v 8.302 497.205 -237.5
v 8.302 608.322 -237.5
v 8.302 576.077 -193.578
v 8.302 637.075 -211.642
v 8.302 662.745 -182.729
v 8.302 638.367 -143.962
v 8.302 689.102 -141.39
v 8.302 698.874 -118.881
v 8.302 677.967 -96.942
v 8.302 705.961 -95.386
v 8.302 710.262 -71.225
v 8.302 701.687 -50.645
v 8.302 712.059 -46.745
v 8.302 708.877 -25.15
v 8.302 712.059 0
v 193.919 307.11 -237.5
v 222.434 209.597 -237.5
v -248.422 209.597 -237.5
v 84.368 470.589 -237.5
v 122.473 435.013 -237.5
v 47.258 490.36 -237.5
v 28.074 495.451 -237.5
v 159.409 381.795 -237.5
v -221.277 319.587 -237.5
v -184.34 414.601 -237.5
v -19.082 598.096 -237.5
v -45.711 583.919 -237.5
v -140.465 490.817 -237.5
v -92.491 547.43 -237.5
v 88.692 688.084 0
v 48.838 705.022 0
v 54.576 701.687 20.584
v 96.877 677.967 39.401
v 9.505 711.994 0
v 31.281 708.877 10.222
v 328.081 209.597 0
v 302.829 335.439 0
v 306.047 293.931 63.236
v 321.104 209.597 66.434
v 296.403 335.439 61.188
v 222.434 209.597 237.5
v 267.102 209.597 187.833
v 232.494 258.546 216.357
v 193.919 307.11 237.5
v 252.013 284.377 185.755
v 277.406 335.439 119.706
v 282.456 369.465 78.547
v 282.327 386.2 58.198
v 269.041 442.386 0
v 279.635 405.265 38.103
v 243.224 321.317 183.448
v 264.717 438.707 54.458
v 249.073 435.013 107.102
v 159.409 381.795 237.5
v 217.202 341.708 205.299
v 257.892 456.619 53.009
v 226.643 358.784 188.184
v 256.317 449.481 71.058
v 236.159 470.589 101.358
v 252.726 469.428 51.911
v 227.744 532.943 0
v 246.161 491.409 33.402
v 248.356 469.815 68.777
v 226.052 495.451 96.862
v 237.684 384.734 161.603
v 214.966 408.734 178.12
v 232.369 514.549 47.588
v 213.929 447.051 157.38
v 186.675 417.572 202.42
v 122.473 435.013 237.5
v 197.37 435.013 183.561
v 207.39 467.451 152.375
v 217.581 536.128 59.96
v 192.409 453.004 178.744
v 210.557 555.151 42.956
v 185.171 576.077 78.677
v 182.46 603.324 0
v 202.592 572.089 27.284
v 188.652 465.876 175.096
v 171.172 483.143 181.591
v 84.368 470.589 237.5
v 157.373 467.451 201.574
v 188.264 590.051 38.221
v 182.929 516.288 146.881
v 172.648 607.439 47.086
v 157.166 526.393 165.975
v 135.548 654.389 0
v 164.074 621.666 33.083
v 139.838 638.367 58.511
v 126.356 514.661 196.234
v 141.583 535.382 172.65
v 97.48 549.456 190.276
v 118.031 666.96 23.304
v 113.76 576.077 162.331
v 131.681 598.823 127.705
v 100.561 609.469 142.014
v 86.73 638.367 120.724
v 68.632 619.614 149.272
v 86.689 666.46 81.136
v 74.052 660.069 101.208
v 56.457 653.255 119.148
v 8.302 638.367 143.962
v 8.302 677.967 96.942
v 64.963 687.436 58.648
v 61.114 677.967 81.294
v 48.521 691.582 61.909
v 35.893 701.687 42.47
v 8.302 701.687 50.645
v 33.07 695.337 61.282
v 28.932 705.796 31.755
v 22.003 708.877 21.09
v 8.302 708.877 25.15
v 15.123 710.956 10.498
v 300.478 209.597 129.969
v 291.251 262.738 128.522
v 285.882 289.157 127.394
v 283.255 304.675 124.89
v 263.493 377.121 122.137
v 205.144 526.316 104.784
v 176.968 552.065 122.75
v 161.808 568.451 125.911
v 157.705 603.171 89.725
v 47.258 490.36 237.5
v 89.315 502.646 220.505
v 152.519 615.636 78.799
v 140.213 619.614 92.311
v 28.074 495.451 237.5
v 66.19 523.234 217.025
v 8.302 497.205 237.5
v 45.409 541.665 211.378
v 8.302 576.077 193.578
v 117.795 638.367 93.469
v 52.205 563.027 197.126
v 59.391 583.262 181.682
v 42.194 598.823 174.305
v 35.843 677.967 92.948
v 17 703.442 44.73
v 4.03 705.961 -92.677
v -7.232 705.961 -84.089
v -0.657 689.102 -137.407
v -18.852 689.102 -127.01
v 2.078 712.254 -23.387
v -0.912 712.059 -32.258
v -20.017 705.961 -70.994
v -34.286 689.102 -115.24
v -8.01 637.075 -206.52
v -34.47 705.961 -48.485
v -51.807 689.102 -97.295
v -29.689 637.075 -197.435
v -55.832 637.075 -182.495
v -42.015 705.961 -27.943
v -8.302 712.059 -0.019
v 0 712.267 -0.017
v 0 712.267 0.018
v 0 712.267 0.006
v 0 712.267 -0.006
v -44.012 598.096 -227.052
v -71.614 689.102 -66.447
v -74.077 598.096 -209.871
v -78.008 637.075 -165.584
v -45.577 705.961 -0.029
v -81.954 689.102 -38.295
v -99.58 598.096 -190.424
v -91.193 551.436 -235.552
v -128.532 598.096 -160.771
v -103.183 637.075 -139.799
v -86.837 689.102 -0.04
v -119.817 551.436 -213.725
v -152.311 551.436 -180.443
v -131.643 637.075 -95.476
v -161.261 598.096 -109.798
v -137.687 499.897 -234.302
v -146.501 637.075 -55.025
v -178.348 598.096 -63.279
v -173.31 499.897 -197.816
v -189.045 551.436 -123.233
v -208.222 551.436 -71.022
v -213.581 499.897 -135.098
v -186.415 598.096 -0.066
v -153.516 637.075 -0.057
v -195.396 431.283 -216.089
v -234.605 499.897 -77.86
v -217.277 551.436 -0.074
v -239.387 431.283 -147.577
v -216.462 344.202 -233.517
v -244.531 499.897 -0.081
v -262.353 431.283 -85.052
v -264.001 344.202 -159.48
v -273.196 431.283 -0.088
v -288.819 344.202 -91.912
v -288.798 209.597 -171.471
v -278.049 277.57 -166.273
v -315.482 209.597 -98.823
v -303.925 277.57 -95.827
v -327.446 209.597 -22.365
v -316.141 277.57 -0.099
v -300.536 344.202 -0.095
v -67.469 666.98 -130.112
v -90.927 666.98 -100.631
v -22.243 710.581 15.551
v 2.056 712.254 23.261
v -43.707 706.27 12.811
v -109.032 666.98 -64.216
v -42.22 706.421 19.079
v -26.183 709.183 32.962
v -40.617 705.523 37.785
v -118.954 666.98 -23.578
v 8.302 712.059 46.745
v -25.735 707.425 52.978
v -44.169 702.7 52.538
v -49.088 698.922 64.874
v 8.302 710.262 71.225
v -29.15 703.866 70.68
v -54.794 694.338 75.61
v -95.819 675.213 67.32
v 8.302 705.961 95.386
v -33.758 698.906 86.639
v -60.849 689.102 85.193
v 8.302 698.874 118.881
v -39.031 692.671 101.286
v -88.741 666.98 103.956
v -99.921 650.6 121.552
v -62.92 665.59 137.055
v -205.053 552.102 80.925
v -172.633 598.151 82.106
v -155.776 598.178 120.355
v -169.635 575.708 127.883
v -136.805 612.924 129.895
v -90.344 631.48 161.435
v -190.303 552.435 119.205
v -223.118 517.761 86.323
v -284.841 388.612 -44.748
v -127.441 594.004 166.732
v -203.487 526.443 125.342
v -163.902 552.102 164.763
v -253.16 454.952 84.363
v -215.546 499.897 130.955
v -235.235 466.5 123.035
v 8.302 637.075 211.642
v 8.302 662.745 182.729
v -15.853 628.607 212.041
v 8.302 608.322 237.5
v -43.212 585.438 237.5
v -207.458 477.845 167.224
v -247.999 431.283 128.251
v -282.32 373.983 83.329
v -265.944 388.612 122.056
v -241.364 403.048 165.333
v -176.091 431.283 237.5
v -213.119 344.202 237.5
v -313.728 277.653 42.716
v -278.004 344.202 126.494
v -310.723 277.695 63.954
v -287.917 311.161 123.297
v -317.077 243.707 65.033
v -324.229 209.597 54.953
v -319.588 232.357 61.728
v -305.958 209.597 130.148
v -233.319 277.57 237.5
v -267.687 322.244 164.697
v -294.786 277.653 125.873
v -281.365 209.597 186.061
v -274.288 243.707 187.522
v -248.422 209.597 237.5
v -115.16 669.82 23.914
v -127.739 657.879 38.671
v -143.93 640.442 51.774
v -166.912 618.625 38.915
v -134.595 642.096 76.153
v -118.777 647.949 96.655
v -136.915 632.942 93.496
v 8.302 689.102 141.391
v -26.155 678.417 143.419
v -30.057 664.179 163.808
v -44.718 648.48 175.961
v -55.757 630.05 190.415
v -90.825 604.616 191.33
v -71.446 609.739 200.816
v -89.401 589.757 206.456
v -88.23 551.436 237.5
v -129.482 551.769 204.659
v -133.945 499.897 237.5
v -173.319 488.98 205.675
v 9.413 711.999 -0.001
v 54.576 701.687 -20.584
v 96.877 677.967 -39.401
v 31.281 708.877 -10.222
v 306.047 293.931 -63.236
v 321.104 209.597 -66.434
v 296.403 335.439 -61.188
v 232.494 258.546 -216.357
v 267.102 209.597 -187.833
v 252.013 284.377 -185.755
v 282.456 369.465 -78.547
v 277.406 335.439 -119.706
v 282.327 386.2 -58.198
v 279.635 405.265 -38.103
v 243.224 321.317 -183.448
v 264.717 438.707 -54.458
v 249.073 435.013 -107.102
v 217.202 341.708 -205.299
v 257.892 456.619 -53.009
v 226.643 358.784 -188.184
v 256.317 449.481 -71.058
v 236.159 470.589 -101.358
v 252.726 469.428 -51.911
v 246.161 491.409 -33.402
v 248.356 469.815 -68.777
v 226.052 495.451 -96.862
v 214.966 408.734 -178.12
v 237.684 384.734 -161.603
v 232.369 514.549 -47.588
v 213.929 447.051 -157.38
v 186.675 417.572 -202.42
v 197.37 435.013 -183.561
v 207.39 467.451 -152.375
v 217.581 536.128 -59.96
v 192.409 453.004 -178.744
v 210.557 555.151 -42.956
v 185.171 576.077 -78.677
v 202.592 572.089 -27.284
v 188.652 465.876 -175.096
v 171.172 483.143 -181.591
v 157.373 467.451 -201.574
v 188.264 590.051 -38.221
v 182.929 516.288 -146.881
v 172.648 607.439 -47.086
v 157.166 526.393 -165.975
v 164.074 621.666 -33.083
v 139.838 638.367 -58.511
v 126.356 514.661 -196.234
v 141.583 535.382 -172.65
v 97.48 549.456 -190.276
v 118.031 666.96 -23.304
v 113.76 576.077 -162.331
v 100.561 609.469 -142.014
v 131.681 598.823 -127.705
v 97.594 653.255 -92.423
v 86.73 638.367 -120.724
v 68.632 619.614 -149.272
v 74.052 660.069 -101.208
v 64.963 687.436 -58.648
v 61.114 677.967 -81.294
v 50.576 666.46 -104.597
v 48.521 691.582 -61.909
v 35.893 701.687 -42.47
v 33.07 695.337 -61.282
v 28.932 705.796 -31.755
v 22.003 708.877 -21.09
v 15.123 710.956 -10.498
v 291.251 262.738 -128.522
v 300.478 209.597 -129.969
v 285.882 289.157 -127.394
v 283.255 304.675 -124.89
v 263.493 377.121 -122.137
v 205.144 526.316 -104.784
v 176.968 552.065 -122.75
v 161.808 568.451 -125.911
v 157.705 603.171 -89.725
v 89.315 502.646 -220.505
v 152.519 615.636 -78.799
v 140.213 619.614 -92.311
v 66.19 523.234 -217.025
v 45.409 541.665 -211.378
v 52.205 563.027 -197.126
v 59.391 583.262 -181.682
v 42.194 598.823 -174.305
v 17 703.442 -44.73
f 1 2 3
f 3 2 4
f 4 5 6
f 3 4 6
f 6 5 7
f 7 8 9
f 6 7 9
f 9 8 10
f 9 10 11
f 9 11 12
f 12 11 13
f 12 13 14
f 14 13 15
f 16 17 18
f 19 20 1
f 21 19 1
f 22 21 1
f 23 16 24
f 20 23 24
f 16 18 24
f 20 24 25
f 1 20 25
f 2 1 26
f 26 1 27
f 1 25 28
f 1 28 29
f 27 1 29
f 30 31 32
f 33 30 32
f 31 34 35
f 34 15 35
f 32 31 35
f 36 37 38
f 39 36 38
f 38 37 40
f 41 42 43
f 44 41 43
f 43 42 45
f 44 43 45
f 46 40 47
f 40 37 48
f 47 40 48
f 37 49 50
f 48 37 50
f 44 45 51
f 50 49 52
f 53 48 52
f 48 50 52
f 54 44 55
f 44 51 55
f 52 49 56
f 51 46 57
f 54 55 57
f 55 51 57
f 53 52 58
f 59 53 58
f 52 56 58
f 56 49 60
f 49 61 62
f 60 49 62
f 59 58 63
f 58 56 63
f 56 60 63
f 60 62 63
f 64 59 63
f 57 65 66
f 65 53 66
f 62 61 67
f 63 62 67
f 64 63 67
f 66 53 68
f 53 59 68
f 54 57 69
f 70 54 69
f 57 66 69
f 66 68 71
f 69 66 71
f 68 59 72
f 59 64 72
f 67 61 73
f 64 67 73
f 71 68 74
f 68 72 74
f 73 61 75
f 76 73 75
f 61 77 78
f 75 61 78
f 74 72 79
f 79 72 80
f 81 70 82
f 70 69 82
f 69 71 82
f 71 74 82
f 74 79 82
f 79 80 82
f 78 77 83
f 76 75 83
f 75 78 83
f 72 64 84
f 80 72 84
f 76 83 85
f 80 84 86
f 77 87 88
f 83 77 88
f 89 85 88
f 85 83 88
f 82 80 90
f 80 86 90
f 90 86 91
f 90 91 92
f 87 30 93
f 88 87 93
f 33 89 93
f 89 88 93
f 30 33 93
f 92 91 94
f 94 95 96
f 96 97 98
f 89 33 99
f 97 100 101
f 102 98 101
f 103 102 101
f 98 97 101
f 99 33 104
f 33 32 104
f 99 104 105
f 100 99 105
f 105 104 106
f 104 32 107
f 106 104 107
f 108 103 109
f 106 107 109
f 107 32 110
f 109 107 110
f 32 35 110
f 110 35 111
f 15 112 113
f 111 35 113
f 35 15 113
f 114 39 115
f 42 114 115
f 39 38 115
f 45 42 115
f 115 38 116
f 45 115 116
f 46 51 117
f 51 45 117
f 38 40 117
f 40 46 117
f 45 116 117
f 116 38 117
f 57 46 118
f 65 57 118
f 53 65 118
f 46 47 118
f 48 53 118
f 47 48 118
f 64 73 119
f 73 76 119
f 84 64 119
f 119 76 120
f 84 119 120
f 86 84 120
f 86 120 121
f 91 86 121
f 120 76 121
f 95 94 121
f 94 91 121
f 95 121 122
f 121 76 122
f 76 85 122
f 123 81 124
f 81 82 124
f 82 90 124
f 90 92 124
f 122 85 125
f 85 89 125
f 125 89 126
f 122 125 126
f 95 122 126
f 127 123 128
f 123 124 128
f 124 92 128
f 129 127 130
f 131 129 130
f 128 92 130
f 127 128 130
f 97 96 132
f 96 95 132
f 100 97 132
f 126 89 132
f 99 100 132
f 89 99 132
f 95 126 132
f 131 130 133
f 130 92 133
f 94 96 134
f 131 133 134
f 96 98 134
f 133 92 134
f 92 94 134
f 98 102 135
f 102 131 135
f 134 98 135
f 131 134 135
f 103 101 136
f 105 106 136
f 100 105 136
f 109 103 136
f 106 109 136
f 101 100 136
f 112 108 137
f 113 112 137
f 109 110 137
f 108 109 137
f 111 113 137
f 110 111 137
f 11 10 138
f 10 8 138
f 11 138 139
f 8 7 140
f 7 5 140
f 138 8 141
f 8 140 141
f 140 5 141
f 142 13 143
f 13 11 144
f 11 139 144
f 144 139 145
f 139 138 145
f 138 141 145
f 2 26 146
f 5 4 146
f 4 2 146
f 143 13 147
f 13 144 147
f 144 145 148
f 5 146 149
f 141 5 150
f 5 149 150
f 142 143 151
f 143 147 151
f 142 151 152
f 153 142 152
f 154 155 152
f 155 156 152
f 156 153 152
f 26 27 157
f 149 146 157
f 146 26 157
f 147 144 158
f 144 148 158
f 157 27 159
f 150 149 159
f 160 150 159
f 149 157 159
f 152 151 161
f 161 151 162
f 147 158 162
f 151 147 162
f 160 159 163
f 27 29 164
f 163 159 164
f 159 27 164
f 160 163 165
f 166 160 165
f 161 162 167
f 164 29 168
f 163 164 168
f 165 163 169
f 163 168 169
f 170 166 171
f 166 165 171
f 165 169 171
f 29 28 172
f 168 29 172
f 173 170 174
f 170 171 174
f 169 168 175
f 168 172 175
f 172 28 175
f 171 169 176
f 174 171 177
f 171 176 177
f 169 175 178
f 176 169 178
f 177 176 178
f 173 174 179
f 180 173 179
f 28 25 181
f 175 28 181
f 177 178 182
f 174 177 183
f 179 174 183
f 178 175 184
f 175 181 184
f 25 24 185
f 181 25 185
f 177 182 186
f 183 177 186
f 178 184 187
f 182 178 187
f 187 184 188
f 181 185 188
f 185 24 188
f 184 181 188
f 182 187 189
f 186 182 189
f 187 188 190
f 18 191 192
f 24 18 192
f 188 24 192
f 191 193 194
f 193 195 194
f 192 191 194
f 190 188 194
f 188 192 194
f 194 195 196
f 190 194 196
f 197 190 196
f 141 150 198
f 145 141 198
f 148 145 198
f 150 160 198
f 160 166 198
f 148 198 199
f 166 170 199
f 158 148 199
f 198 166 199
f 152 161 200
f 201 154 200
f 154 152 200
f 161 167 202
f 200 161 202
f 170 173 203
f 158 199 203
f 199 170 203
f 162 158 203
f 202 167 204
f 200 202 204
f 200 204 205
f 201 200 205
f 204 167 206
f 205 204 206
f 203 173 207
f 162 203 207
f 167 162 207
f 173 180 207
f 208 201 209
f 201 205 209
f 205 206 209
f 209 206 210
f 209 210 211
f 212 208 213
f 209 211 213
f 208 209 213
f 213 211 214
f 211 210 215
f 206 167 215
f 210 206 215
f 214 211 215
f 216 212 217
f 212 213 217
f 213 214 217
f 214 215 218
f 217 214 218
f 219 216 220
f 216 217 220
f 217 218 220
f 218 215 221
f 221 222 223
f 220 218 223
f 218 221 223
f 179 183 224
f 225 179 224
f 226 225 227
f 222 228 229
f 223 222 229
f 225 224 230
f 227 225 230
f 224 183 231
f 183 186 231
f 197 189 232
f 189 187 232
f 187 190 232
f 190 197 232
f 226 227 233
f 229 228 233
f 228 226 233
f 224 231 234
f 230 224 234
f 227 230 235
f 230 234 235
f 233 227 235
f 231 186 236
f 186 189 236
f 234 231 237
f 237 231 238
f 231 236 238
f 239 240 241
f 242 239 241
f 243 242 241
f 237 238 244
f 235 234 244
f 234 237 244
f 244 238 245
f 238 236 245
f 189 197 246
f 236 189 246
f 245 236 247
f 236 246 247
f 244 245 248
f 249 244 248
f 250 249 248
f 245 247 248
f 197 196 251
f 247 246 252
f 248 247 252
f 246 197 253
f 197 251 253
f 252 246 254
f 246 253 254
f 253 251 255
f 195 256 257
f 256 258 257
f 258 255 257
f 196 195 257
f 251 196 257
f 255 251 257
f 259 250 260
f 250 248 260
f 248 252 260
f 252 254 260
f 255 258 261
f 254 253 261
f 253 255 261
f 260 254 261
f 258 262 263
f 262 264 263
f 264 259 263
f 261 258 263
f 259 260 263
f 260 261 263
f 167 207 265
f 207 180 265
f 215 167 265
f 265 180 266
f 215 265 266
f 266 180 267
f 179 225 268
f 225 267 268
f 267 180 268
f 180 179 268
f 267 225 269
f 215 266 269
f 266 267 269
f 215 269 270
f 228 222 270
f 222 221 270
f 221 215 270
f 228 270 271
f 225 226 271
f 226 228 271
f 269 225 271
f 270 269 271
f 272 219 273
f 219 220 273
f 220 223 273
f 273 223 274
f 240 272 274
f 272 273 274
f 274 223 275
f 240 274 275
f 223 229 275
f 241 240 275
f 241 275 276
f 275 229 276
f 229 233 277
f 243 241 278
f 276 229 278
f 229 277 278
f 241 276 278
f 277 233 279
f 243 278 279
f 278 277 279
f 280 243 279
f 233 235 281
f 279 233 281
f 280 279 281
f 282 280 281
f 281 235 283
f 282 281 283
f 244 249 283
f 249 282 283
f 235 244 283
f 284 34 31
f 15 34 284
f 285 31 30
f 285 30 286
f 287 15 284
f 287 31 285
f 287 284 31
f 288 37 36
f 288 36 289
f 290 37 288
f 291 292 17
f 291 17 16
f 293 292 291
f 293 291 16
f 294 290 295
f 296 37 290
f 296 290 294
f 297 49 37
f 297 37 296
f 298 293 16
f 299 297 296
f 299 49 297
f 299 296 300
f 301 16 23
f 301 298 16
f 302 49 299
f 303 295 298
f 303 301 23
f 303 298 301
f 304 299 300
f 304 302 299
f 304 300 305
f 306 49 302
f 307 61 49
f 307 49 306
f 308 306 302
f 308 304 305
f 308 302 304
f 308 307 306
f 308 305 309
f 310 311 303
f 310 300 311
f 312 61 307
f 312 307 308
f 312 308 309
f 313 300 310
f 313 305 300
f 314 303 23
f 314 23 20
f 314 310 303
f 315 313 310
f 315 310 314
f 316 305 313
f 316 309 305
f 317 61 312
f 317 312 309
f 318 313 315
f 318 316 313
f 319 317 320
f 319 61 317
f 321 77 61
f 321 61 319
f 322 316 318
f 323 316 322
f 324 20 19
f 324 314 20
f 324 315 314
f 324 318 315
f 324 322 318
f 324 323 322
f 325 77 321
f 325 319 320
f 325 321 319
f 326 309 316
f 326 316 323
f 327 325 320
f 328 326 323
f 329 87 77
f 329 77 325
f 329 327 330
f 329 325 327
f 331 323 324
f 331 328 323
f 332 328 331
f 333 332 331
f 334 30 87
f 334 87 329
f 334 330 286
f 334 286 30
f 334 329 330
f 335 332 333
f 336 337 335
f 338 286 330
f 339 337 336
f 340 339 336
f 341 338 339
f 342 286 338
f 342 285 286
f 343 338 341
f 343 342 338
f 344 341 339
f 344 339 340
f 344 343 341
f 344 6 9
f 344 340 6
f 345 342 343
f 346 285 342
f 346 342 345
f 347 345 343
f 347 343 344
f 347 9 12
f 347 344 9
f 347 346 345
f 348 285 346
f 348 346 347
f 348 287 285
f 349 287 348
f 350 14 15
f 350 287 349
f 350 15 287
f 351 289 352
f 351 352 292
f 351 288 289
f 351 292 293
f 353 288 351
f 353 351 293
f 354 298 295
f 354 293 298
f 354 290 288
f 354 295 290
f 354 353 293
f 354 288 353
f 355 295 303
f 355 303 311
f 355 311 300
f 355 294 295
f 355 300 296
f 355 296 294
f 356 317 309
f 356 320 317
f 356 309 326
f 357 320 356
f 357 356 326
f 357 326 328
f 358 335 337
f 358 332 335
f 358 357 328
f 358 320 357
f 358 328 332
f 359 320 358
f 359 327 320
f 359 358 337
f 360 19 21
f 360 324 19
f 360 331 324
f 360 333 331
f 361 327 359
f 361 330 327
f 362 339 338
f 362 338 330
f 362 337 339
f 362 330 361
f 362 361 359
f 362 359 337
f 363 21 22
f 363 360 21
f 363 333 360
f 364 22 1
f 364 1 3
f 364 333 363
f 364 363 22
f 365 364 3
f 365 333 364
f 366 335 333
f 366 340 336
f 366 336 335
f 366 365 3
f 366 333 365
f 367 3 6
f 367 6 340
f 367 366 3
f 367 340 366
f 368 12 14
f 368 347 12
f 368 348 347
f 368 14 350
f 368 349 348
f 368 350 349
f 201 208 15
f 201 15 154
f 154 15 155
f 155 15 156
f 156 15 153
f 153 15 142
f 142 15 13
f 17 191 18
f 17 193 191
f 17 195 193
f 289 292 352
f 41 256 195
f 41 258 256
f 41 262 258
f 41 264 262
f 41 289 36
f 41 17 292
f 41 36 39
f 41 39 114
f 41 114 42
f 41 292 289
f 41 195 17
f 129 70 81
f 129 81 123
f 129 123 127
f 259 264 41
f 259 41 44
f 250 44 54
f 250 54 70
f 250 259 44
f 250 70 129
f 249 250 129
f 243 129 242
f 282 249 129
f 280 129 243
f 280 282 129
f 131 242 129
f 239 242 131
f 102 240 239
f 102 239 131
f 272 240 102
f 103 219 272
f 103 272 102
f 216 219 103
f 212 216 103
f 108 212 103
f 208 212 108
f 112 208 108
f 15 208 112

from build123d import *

# Parameters (mm, degrees)
BOSS_EXTRUDE1_DEPTH          = 237.5
BOSS_EXTRUDE1_DEPTH_BACK     = 237.5
SKETCH1_RX                   = 712.26718515
SKETCH1_RY                   = 343.28059296
SKETCH7_W                    = 1048.477934303
SKETCH7_H                    = 944.198935412
CUT_EXTRUDE2_DEPTH           = 923.383384794
CUT_REVOLVE4_ANGLE           = 90
CUT_REVOLVE4_OTHER_WAY_ANGLE = 90


with BuildPart() as part:
    # Sketch1 → Boss-Extrude1 (new, two sides: drawn at the far end of the back side and taken through both)
    with BuildSketch(Plane.XY.offset(-BOSS_EXTRUDE1_DEPTH_BACK)):
        with Locations(Location((0, 0), (0, 0, 90))):
            Ellipse(SKETCH1_RX, SKETCH1_RY)
    extrude(amount=BOSS_EXTRUDE1_DEPTH + BOSS_EXTRUDE1_DEPTH_BACK)

    # Sketch7 → Cut-Extrude2 (cut, through all)
    with BuildSketch(Plane.XY.offset(237.5)):
        with Locations((-29.38771787, -262.502282556)):
            Rectangle(SKETCH7_W, SKETCH7_H)
    extrude(amount=-CUT_EXTRUDE2_DEPTH, mode=Mode.SUBTRACT)

    # Sketch11 → Cut-Revolve2 (revolve, cut)
    with BuildSketch(Plane.XY):
        with BuildLine():
            Line((-343.28059296, 0), (-743.226651757, 0))
            Line((-743.226651757, 0), (-743.226651757, 860.341056905))
            Line((-743.226651757, 860.341056905), (0, 860.341056905))
            Line((0, 860.341056905), (0, 712.26718515))
            add(Edge.make_bspline(
                [(0, 712.26718515), (-343.28059296, 712.26718515), (-343.28059296, 0)],
                knots=[0, 0, 0, 1.570796327, 1.570796327, 1.570796327], degree=2, weights=[1, 0.707106781, 1]))
        make_face()
    revolve(axis=Axis((65.79623911, 0, 0), (0, 1, 0)), mode=Mode.SUBTRACT)

    # Sketch15 → Cut-Revolve4 (revolve, cut)
    with BuildSketch(Plane.XY):
        with BuildLine():
            Line((8.302449854, 946.581815565), (524.826005951, 946.581815565))
            Line((524.826005951, 946.581815565), (524.826005951, 209.59718515))
            Line((524.826005951, 209.59718515), (328.081176474, 209.597185149))
            add(Edge.make_bspline(
                [(328.081176474, 209.597185149), (255.359120318, 699.657333261), (8.302449854, 712.0588366)],
                knots=[5.011078122, 5.011078122, 5.011078122, 6.258997341, 6.258997341, 6.258997341], degree=2, weights=[1, 0.81157141, 1]))
            Line((8.302449854, 712.0588366), (8.302449854, 946.581815565))
        make_face()
    revolve(axis=Axis((8.302449854, 1026.356298718, 0), (0, 1, 0)), revolution_arc=CUT_REVOLVE4_ANGLE, mode=Mode.SUBTRACT)

    # Sketch15 → Cut-Revolve4 other way (revolve, cut)
    with BuildSketch(Plane.XY):
        with BuildLine():
            Line((8.302449854, 946.581815565), (524.826005951, 946.581815565))
            Line((524.826005951, 946.581815565), (524.826005951, 209.59718515))
            Line((524.826005951, 209.59718515), (328.081176474, 209.597185149))
            add(Edge.make_bspline(
                [(328.081176474, 209.597185149), (255.359120318, 699.657333261), (8.302449854, 712.0588366)],
                knots=[5.011078122, 5.011078122, 5.011078122, 6.258997341, 6.258997341, 6.258997341], degree=2, weights=[1, 0.81157141, 1]))
            Line((8.302449854, 712.0588366), (8.302449854, 946.581815565))
        make_face()
    revolve(axis=Axis((8.302449854, 1026.356298718, 0), (0, -1, 0)), revolution_arc=CUT_REVOLVE4_OTHER_WAY_ANGLE, mode=Mode.SUBTRACT)


solid = part.part
